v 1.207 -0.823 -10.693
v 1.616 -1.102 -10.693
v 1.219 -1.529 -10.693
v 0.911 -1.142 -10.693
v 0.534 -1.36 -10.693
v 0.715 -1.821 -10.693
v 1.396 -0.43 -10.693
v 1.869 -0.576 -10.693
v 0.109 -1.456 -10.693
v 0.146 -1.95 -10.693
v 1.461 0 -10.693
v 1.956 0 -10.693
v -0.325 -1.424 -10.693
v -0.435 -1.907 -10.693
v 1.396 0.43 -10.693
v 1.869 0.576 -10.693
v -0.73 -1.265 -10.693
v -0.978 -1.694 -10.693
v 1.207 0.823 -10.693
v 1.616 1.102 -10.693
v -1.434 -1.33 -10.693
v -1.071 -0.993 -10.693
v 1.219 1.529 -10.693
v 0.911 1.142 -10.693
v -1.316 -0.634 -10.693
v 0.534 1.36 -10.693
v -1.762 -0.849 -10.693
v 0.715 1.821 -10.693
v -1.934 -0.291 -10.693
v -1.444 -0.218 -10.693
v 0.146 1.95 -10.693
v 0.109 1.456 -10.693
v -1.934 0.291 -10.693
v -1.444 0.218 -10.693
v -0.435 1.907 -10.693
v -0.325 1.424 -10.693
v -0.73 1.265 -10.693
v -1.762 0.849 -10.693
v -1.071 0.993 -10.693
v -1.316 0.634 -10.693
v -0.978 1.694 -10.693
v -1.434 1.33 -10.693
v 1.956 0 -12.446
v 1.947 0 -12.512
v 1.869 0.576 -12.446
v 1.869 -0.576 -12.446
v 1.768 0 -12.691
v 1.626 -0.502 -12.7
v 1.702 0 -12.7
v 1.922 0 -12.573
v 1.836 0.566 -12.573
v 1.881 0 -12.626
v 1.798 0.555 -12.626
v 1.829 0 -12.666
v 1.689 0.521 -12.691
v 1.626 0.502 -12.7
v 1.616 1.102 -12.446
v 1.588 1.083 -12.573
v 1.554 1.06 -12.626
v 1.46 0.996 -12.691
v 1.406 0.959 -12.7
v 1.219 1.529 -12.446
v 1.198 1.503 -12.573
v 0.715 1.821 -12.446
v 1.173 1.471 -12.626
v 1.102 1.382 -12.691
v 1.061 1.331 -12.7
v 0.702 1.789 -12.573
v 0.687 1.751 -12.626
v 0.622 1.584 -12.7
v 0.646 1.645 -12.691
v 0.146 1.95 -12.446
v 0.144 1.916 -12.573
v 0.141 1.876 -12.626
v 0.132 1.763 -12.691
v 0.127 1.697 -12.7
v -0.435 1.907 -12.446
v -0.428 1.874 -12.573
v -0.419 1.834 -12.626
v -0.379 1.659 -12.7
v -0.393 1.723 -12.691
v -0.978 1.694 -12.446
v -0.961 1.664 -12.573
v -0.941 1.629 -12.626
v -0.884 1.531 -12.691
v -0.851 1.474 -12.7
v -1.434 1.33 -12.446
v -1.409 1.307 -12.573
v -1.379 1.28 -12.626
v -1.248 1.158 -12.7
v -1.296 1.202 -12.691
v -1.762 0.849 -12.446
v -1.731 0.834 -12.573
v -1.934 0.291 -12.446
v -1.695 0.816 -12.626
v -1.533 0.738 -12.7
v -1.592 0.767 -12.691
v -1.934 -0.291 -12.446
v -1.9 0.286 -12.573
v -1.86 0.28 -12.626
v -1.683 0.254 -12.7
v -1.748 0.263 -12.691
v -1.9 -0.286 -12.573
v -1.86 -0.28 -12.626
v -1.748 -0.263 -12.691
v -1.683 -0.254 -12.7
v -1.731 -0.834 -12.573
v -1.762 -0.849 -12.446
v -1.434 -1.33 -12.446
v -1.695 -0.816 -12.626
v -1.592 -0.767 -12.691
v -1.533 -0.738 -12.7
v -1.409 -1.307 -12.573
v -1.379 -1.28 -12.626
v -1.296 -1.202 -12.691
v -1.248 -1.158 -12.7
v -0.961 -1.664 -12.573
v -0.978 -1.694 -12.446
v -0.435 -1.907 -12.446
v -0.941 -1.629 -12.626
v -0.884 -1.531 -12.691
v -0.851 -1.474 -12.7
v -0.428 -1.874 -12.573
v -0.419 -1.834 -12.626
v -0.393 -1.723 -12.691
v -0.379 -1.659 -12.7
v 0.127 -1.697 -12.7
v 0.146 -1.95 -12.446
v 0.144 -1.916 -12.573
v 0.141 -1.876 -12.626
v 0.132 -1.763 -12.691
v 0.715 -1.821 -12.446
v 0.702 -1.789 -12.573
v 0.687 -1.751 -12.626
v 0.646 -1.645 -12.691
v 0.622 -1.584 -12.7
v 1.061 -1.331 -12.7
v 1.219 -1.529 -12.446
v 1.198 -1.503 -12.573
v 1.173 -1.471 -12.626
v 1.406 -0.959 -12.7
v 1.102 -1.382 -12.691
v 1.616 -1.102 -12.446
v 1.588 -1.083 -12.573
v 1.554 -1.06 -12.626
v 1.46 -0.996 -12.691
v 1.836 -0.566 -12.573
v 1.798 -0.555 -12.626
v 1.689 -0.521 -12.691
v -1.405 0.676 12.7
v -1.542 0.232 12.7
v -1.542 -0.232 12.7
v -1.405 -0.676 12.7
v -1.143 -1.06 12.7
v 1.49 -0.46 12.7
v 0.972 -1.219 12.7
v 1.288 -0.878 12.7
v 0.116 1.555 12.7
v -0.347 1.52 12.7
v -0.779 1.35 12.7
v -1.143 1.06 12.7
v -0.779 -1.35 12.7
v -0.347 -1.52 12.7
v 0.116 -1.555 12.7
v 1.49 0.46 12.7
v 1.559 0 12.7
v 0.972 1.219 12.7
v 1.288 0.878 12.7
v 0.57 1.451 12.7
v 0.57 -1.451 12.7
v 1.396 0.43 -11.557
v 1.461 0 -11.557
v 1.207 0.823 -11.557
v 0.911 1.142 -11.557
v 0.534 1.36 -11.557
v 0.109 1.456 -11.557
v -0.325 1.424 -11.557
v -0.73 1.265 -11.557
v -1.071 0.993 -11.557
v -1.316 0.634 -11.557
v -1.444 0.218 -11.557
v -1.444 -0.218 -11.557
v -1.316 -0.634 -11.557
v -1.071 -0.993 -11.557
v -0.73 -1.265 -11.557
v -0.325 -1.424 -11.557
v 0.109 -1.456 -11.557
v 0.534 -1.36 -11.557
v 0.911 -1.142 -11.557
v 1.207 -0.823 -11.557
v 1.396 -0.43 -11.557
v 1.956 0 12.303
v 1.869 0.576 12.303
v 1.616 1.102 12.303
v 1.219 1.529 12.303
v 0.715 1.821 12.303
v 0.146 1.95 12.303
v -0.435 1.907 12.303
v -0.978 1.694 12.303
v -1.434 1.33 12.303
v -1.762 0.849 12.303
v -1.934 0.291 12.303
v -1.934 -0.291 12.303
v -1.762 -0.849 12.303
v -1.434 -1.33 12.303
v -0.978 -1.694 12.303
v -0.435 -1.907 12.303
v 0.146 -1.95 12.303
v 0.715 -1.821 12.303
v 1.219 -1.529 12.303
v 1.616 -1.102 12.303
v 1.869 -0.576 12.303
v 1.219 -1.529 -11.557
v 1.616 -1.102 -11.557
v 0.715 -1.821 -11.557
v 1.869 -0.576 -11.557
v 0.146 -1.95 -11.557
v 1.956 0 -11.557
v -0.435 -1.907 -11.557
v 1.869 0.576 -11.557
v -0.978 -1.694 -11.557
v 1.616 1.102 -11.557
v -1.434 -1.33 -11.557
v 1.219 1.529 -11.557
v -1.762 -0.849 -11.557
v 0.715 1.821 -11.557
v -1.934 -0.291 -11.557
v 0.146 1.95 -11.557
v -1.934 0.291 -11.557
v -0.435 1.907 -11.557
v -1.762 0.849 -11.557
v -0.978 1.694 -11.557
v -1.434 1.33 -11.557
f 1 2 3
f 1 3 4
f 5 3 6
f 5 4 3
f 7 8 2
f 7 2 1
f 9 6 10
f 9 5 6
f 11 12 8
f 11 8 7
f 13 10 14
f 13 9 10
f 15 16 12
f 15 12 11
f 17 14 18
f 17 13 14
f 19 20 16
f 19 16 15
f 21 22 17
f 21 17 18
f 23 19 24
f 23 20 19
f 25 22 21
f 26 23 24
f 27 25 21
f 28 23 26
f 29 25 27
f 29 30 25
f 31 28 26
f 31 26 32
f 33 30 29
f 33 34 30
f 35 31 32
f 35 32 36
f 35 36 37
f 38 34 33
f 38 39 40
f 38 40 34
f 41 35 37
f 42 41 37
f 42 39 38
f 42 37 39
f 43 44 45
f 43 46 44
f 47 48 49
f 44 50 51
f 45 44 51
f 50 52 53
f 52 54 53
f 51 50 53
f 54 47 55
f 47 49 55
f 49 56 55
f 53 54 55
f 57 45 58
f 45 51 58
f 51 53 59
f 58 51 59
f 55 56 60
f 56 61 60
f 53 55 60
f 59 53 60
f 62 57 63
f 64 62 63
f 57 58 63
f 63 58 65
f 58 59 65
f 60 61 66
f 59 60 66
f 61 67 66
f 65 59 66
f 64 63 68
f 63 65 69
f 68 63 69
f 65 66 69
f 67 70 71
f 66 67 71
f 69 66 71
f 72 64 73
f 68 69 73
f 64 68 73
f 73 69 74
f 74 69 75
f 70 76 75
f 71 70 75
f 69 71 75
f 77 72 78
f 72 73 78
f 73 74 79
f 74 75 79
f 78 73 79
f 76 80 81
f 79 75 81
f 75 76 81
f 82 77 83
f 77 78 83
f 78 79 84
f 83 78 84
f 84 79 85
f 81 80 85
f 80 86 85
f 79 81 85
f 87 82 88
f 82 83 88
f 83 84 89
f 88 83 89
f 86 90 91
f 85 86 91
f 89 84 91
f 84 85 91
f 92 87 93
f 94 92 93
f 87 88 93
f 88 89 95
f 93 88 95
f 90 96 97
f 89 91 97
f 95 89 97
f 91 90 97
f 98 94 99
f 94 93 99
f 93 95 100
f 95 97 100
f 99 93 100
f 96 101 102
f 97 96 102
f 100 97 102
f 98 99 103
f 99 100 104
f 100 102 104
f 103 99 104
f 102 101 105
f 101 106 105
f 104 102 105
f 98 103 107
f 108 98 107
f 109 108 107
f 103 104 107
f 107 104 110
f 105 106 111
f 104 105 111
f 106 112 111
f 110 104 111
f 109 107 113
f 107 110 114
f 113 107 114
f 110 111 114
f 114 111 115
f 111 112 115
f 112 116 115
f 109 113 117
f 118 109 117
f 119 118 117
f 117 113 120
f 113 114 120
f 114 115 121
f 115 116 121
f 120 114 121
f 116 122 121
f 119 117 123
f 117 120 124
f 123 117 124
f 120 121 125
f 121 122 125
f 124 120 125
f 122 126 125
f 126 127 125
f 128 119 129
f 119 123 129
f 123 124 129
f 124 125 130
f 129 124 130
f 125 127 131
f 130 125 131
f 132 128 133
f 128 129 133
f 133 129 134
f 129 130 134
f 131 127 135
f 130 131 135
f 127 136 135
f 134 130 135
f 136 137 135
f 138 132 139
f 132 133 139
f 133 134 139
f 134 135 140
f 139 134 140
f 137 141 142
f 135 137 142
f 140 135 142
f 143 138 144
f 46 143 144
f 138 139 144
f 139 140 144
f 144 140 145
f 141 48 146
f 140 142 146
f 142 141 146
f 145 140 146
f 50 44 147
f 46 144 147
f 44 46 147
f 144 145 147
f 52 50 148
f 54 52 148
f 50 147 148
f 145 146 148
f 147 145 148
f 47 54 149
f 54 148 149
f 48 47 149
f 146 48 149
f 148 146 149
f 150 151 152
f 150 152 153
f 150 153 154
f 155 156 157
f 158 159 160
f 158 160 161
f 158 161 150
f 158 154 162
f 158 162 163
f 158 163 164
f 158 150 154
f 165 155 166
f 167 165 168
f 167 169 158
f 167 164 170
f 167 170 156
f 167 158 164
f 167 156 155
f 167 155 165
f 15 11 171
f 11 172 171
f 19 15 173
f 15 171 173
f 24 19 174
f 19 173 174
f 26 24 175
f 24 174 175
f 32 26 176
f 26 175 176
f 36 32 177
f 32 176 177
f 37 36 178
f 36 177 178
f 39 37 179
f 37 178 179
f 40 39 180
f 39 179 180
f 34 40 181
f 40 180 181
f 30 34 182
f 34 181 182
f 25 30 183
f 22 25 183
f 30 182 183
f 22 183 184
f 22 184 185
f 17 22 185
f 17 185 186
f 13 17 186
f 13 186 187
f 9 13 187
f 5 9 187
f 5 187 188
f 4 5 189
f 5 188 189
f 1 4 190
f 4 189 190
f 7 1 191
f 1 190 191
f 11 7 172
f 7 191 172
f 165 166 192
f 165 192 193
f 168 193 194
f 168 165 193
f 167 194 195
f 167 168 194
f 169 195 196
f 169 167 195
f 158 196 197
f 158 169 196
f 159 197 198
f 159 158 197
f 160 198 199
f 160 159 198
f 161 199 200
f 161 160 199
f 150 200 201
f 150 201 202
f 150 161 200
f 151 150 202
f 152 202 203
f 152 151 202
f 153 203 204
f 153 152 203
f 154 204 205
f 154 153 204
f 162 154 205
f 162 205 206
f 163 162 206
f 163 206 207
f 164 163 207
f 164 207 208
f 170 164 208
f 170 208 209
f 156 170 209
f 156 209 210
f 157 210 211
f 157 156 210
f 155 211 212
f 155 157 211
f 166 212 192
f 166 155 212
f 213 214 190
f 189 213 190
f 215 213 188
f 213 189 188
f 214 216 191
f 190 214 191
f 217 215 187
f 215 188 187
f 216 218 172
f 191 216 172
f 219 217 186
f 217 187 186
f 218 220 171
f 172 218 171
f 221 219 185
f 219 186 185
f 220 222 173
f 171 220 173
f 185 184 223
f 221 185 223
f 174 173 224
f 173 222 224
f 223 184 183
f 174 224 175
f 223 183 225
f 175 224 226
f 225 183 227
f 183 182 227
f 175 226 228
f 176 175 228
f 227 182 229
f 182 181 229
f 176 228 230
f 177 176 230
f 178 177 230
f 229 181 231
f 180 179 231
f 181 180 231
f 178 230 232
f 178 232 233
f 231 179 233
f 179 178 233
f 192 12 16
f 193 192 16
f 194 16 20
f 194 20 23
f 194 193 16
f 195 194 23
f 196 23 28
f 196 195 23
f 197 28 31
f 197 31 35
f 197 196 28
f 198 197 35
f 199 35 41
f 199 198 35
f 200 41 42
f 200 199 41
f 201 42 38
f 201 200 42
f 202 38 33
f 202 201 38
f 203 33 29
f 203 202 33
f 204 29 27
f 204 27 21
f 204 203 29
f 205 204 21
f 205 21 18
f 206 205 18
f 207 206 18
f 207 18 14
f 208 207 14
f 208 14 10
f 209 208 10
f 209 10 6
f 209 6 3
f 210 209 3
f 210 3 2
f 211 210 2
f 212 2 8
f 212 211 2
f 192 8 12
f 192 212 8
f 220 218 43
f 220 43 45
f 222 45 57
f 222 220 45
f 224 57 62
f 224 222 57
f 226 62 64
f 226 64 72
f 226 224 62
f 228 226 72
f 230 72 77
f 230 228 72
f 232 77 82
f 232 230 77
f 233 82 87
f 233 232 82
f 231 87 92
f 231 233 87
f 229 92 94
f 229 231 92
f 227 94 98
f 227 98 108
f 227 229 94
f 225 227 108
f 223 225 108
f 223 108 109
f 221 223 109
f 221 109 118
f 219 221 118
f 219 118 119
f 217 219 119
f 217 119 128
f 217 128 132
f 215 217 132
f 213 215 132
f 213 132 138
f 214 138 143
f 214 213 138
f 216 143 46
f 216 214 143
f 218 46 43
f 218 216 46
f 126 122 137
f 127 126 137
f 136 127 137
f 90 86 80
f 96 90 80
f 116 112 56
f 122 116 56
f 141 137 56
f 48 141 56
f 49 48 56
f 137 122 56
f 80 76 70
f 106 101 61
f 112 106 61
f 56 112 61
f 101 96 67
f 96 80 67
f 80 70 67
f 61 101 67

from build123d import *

# Parameters (mm, degrees)
SKETCH1_R      = 1.9558
EXTRUDE1_DEPTH = 12.7
SKETCH2_W      = 0.4953
SKETCH2_H      = 0.8636
FILLET1_R      = 0.254
CHAMFER1_SIZE  = 0.396875


with BuildPart() as part:
    # Sketch1 → Extrude1 (new body, symmetric)
    with BuildSketch(Plane.XY):
        Circle(SKETCH1_R)
    extrude(amount=EXTRUDE1_DEPTH, both=True)

    # Sketch2 → Cut-Revolve1 (revolve, cut)
    with BuildSketch(Plane(origin=(0, 0, 0), x_dir=(1, 0, 0), z_dir=(0, 1, 0))):
        with Locations((1.70815, 11.1252)):
            Rectangle(SKETCH2_W, SKETCH2_H)
    revolve(axis=Axis((0, 0, -10.042474892), (0, 0, 1)), mode=Mode.SUBTRACT)

    # Fillet1
    fillet1_edges = [part.edges().sort_by_distance(p)[0] for p in [
        (-1.9558, 0, -12.7),
    ]]
    fillet(fillet1_edges, radius=FILLET1_R)

    # Chamfer1
    chamfer1_edges = [part.edges().sort_by_distance(p)[0] for p in [
        (-1.9558, 0, 12.7),
    ]]
    chamfer(chamfer1_edges, length=CHAMFER1_SIZE)


solid = part.part
